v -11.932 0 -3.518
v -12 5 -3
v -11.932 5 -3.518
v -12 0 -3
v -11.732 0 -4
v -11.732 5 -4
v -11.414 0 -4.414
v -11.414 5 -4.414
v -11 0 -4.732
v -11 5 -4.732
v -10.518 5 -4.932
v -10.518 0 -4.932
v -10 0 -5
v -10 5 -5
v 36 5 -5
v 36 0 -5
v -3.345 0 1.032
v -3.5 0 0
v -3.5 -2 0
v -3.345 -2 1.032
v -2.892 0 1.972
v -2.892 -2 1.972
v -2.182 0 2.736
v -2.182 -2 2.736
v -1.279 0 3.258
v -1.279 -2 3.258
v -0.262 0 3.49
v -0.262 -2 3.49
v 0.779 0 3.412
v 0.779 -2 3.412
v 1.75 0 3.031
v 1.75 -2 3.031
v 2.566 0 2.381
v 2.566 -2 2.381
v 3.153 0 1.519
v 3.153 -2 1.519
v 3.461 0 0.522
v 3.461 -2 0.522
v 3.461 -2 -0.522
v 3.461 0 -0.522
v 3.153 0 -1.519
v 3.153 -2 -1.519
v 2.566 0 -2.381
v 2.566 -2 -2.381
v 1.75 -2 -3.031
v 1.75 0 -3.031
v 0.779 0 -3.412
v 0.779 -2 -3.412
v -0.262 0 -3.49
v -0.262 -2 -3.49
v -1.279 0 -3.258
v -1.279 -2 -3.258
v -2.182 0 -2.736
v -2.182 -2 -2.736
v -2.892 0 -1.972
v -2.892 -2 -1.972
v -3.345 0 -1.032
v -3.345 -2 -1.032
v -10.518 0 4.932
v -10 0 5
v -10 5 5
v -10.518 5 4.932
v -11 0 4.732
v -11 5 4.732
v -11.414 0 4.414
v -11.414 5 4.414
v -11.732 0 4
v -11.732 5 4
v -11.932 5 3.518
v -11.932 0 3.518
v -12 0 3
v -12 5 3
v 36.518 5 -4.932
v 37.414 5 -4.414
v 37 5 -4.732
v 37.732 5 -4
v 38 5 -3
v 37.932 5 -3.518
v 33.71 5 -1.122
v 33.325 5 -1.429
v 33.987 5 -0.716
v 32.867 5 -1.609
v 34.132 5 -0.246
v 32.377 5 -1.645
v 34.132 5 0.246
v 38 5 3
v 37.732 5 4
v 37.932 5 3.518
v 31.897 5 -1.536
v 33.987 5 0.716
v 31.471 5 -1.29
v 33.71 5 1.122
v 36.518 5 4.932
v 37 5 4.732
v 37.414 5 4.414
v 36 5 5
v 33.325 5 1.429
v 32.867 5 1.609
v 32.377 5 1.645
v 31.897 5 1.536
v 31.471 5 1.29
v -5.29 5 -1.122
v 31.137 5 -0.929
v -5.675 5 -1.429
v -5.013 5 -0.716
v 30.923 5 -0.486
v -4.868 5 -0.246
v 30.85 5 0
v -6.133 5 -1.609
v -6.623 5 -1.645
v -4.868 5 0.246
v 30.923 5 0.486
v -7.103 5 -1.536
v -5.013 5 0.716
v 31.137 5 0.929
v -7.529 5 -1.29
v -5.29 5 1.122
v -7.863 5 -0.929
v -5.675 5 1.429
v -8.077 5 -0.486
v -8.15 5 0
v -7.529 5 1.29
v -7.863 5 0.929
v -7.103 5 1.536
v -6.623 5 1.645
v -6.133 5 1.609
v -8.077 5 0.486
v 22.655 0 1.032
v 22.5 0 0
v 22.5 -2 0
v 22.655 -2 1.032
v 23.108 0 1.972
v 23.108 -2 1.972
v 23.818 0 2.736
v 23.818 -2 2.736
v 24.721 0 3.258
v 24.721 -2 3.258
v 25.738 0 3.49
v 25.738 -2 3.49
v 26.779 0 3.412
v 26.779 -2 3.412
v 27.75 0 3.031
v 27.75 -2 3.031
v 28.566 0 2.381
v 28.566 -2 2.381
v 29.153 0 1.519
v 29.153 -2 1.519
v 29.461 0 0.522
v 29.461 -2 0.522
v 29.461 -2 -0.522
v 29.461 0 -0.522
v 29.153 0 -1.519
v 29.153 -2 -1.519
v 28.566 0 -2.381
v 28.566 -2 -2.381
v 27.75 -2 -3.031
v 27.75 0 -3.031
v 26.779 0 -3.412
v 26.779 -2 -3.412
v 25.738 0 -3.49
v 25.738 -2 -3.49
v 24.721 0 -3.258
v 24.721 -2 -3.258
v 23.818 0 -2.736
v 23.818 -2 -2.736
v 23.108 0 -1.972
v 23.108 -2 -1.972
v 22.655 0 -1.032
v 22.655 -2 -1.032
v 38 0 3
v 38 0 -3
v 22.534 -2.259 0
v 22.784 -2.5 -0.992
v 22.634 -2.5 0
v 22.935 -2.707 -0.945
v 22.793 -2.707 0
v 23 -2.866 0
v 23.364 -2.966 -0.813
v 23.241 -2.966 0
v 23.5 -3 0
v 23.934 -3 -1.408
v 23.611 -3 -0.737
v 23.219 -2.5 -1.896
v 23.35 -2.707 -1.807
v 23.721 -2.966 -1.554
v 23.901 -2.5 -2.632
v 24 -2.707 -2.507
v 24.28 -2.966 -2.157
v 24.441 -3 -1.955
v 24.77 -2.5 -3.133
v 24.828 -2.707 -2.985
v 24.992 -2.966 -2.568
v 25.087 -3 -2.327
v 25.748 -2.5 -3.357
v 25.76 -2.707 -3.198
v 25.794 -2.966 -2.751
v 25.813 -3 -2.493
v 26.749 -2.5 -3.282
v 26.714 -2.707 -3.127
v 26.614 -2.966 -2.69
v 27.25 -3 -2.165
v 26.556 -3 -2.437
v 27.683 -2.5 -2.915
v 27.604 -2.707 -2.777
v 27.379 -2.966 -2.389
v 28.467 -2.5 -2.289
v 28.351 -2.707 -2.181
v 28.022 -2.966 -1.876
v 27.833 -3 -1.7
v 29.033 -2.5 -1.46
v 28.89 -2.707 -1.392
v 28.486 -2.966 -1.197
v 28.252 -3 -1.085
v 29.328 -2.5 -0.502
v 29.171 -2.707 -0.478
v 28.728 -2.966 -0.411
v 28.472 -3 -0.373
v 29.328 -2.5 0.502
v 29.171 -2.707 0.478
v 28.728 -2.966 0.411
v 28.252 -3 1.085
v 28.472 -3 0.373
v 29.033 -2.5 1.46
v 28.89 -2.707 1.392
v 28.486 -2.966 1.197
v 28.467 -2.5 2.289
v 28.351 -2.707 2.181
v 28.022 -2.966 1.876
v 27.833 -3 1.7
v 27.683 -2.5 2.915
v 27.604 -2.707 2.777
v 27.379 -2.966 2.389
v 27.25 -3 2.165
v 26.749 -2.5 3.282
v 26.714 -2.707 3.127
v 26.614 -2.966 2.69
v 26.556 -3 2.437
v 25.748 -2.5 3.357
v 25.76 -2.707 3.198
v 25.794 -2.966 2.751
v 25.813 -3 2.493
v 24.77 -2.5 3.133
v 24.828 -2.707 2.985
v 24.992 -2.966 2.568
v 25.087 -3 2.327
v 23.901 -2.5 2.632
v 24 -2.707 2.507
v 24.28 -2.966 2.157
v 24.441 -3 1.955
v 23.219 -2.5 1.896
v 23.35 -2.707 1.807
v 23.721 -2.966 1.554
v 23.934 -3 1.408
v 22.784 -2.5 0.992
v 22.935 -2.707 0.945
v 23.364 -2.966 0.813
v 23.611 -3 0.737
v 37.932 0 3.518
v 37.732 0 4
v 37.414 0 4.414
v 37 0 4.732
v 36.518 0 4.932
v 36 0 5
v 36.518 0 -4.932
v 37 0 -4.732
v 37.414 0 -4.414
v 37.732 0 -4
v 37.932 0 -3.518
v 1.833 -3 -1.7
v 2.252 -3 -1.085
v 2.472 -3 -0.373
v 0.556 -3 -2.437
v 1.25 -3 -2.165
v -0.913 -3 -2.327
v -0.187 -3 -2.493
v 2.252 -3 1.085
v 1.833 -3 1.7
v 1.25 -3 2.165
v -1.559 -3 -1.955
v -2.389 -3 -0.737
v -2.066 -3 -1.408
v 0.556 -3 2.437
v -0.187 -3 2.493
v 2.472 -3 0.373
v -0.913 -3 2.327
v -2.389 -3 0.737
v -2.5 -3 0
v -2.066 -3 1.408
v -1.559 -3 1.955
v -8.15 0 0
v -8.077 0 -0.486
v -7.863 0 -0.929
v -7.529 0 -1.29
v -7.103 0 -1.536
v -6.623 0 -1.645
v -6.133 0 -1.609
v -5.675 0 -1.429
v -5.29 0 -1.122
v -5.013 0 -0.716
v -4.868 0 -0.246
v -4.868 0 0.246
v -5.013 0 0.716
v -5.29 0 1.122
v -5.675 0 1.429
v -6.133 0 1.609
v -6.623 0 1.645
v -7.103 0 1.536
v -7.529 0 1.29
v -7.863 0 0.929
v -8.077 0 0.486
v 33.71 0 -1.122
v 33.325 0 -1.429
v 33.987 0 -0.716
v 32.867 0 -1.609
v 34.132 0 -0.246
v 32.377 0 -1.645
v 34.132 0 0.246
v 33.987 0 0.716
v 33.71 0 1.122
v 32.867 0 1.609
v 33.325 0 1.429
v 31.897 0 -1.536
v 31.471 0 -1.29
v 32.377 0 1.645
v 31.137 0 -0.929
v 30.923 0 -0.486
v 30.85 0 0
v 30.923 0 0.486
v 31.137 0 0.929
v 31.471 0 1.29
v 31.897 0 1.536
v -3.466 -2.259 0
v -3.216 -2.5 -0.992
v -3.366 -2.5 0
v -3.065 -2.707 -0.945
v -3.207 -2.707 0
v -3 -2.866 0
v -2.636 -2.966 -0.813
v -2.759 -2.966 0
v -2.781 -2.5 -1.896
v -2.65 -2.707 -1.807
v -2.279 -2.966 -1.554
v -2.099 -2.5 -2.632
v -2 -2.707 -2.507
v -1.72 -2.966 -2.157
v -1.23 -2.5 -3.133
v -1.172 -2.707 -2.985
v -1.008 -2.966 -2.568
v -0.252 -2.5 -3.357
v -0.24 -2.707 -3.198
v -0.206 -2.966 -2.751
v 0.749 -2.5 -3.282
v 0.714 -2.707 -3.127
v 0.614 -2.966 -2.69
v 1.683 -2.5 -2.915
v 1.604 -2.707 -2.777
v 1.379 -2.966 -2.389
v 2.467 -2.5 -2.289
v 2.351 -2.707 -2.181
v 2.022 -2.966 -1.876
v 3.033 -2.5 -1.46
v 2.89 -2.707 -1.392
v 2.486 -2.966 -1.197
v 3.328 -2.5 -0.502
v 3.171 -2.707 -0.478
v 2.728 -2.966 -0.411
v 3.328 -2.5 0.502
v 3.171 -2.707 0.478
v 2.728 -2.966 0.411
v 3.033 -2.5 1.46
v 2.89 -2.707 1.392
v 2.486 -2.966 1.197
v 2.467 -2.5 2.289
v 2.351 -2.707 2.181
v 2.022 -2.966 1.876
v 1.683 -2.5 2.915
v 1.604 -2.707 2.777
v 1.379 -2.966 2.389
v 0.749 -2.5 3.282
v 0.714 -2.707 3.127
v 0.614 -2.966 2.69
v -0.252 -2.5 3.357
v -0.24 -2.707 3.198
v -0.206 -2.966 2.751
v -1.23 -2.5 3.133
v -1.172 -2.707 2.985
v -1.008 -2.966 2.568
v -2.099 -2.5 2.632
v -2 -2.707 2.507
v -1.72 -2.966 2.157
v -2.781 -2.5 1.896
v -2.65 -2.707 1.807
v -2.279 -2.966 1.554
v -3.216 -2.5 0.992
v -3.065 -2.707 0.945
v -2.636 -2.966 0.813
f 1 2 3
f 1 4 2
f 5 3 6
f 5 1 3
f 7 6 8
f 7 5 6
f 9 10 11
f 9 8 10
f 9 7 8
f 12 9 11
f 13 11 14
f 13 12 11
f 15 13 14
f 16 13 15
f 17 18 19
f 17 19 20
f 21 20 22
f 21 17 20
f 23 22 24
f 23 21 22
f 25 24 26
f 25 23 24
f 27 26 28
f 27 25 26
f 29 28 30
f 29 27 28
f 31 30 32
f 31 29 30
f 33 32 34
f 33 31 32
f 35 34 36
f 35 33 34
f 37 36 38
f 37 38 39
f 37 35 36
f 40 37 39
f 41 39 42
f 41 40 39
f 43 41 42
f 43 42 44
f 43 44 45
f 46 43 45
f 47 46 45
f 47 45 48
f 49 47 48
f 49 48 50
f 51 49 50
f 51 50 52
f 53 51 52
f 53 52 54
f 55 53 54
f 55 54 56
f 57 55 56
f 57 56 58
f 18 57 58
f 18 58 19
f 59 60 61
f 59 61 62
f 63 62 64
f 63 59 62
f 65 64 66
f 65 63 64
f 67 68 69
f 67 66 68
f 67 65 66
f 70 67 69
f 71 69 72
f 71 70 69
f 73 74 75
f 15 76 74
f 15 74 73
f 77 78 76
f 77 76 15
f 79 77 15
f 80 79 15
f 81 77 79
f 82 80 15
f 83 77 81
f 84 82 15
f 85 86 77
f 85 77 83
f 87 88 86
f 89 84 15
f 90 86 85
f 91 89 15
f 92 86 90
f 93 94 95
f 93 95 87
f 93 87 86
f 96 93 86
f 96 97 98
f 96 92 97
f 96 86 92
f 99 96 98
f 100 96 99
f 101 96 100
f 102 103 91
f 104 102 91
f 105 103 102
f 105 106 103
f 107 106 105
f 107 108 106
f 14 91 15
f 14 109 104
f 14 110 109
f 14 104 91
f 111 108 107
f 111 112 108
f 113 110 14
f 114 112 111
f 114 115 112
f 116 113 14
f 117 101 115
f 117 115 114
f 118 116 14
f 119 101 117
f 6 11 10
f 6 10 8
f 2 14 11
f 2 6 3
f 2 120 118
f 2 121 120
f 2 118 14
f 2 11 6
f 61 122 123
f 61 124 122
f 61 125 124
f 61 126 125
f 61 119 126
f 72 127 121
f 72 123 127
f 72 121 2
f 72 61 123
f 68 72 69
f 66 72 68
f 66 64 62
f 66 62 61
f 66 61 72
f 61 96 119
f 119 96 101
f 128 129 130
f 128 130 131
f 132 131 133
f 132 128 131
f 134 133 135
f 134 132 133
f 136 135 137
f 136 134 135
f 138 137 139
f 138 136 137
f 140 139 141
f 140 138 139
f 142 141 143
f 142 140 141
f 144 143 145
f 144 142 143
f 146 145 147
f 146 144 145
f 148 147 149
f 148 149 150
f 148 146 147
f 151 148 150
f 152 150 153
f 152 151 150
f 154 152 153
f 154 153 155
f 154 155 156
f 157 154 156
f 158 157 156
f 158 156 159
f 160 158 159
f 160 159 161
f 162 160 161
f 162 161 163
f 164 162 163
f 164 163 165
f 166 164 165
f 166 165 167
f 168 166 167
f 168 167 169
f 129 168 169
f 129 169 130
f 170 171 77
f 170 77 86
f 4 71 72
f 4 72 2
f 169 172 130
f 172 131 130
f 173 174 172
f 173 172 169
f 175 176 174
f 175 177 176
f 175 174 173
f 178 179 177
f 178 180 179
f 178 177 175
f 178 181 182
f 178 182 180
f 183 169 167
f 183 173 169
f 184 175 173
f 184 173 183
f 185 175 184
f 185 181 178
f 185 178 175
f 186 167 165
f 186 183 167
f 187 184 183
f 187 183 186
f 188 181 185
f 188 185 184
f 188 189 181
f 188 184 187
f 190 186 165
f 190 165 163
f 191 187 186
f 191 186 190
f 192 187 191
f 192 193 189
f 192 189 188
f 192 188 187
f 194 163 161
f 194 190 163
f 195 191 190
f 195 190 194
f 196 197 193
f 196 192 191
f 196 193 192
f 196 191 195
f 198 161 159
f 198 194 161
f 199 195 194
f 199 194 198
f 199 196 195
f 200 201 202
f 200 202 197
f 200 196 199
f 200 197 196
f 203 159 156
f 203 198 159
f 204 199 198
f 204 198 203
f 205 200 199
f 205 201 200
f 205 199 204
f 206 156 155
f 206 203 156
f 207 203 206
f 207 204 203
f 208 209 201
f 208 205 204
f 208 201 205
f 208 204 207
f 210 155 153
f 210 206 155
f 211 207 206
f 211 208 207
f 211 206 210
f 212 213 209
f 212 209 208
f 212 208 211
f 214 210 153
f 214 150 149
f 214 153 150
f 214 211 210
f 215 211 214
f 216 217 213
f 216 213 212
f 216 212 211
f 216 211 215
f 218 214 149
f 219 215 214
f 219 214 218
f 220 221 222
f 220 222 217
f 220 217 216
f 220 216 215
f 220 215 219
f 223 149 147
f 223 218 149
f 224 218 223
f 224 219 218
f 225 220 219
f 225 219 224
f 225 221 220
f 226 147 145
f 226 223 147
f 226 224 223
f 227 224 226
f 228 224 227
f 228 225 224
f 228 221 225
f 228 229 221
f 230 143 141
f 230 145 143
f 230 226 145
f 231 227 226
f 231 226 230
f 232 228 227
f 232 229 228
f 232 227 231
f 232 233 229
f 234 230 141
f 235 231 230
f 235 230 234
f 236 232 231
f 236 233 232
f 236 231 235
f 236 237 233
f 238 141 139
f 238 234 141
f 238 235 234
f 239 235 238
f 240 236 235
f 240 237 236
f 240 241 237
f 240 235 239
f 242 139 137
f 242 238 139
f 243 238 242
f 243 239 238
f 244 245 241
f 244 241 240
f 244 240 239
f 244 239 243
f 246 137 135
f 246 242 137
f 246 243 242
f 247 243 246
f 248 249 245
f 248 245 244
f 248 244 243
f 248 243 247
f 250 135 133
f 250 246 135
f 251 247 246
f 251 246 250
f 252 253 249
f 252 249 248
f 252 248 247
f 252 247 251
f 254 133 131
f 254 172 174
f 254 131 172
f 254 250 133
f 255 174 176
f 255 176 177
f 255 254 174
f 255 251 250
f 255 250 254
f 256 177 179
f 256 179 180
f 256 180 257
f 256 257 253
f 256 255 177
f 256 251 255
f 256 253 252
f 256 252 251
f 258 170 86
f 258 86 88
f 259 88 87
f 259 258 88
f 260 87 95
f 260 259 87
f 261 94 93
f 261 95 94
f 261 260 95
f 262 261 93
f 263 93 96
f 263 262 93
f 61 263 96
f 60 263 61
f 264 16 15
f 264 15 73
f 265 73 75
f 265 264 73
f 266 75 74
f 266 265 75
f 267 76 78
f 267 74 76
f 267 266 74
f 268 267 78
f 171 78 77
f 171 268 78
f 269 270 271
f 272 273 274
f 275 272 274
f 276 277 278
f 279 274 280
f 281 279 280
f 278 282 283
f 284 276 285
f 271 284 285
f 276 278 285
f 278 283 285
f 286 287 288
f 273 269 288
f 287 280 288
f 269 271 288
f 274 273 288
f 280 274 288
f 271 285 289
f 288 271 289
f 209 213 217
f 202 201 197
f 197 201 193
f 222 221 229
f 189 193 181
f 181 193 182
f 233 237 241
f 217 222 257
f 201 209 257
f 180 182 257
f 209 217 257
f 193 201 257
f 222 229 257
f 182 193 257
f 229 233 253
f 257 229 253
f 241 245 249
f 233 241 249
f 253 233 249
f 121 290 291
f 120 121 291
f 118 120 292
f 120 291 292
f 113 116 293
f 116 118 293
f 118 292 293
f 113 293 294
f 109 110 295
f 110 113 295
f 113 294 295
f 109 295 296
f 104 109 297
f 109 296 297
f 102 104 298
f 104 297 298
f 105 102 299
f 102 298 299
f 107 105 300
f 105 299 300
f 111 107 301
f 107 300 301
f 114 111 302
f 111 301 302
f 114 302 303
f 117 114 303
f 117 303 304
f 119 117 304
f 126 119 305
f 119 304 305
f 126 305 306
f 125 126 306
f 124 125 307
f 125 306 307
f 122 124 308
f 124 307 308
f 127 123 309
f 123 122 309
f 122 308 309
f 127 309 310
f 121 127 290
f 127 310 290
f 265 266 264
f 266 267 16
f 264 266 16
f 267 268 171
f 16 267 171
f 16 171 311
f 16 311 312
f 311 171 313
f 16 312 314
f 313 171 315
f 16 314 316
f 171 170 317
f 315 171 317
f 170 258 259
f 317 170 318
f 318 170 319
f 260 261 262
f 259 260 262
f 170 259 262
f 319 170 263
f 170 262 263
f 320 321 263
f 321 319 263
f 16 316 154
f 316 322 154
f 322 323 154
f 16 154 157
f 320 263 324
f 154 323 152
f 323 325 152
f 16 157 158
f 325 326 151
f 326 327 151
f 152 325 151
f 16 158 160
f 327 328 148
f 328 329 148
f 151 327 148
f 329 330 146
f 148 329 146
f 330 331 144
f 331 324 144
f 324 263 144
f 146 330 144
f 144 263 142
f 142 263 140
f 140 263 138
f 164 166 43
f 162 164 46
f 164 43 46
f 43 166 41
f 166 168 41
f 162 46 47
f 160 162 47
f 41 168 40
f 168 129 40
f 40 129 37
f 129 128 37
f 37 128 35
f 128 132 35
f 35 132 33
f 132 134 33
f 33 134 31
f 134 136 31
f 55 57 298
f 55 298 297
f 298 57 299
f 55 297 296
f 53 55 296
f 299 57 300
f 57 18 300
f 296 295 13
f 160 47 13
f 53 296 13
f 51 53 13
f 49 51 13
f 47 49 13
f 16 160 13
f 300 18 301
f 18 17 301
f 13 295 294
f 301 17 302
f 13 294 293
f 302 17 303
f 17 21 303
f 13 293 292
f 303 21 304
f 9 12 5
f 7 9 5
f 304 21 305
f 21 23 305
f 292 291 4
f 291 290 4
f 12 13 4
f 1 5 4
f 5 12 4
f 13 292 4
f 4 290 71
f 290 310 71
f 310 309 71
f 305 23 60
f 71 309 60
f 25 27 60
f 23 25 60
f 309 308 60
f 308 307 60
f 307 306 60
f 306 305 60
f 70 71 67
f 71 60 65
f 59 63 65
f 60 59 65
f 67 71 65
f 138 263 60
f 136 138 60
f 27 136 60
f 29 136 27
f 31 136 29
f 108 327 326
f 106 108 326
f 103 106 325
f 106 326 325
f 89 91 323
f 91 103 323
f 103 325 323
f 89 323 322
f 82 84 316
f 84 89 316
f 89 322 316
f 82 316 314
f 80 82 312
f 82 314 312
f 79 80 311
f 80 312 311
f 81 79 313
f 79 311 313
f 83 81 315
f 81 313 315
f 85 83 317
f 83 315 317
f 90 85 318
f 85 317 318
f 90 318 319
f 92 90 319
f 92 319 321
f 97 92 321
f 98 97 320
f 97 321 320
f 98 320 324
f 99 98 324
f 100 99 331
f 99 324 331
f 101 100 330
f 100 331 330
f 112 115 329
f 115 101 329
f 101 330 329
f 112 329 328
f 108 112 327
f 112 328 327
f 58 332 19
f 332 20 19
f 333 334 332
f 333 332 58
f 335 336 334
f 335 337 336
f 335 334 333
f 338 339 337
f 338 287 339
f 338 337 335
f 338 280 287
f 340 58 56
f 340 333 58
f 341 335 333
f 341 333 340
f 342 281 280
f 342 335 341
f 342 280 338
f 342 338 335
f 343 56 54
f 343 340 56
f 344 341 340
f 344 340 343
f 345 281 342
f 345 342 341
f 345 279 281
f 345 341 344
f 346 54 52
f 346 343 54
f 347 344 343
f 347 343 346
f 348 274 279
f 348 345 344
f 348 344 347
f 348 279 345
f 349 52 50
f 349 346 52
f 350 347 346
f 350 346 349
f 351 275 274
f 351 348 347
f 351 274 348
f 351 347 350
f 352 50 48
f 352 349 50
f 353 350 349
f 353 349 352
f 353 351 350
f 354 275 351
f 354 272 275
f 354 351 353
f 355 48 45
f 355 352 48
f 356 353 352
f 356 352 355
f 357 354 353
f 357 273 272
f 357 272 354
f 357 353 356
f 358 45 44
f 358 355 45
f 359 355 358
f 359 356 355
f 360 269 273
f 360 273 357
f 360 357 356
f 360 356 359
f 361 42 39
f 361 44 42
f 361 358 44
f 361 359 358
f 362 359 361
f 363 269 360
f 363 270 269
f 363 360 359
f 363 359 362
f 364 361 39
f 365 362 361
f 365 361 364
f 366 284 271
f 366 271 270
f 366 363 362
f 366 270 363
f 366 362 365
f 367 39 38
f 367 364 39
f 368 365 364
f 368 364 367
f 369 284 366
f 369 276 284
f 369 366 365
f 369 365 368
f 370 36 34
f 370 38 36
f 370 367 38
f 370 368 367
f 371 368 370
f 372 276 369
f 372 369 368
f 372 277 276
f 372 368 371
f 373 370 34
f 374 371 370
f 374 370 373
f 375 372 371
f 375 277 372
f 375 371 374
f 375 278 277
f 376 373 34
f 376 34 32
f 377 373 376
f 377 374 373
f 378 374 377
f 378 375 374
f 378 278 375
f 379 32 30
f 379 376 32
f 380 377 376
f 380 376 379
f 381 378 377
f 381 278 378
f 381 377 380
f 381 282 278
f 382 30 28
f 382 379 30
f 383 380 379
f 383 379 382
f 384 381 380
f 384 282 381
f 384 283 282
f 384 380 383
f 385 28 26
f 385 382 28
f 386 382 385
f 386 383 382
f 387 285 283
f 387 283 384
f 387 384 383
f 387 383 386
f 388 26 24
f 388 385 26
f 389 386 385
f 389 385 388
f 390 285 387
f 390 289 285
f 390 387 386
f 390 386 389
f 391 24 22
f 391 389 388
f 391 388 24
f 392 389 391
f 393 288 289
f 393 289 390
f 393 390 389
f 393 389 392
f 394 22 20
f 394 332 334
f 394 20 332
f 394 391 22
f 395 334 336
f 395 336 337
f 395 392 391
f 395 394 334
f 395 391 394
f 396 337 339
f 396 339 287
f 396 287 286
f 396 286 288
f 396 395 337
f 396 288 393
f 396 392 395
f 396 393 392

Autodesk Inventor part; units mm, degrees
ref_plane "YZ Plane" through (0, 0, 0) normal (1, 0, 0) x (0, 1, 0)
ref_plane "XZ Plane" through (0, 0, 0) normal (0, 1, 0) x (-1, 0, 0)
ref_plane "XY Plane" through (0, 0, 0) normal (0, 0, 1) x (1, 0, 0)
sketch "Эскиз1" plane through (0, 0, 0) normal (0, 1, 0) x (-1, 0, 0)
  circle A0 centre (0, 0) radius 3.5
  circle A1 centre (-26, 0) radius 3.5
  line L0 (-3.5, 0) -> (-22.5, 0) construction
  line L1 (0, 0) -> (-26, 0) construction
  circle A2 centre (-32.5, 0) radius 1.65
  circle A3 centre (6.5, 0) radius 1.65
  line L2 (10, -5) -> (-36, -5)
  line L3 (-38, -3) -> (-38, 3)
  line L4 (-36, 5) -> (10, 5)
  line L5 (12, 3) -> (12, -3)
  arc A4 (10, -5) -> (12, -3) centre (10, -3) ccw
  arc A5 (12, 3) -> (10, 5) centre (10, 3) ccw
  arc A6 (-38, -3) -> (-36, -5) centre (-36, -3) ccw
  arc A7 (-36, 5) -> (-38, 3) centre (-36, 3) ccw
  circle A8 centre (-32.5, 0) radius 3.65
  circle A9 centre (6.5, 0) radius 3.65
  point P0 (3.5, 0)
  point P1 (4.85, 0)
  point P2 (-29.5, 0)
  point P3 (-30.85, 0)
  point P4 (-29.5, 0)
  point P5 (-30.85, 0)
  point P6 (-29.5, 0)
  point P7 (-30.85, 0)
  point P8 (-29.5, 0)
  point P9 (-30.85, 0)
  dimension "d4" = 3.3
  dimension "d5" = 3.3
  dimension "d0" = 7
  dimension "d1" = 7
  dimension "d3" = 19
  dimension "d8" = 3
  dimension "d9" = 3
  dimension "d10" = 12
  dimension "d11" = 12
  dimension "d12" = 5
  dimension "d13" = 10
  dimension "d14" = 2
  dimension "d15" = 2
  dimension "d16" = 2
extrude "Выдавливание1" add sketch "Эскиз1" along normal blind 5 contours A0 A9 | A0 A9 | A9 A0 | A1 A8 | A8 A1 | A1 A8 | L2 A6 L3 A7 L4 A5 L5 A4
extrude "Выдавливание2" add sketch "Эскиз1" against normal blind 3 contours A0 A9 | A9 A0 | A1 A8 | A8 A1 picked at (3.0809, 0.424) picked at (-1.3483, -0.2837) picked at (-24.6517, 0.2837) picked at (-29.2672, -0.4241)
fillet "Сопряжение1" radius 1 2 edges at (3.5, -3, 0) (29.5, -3, 0)
properties part number "Conductor_Volume_Encoder"
